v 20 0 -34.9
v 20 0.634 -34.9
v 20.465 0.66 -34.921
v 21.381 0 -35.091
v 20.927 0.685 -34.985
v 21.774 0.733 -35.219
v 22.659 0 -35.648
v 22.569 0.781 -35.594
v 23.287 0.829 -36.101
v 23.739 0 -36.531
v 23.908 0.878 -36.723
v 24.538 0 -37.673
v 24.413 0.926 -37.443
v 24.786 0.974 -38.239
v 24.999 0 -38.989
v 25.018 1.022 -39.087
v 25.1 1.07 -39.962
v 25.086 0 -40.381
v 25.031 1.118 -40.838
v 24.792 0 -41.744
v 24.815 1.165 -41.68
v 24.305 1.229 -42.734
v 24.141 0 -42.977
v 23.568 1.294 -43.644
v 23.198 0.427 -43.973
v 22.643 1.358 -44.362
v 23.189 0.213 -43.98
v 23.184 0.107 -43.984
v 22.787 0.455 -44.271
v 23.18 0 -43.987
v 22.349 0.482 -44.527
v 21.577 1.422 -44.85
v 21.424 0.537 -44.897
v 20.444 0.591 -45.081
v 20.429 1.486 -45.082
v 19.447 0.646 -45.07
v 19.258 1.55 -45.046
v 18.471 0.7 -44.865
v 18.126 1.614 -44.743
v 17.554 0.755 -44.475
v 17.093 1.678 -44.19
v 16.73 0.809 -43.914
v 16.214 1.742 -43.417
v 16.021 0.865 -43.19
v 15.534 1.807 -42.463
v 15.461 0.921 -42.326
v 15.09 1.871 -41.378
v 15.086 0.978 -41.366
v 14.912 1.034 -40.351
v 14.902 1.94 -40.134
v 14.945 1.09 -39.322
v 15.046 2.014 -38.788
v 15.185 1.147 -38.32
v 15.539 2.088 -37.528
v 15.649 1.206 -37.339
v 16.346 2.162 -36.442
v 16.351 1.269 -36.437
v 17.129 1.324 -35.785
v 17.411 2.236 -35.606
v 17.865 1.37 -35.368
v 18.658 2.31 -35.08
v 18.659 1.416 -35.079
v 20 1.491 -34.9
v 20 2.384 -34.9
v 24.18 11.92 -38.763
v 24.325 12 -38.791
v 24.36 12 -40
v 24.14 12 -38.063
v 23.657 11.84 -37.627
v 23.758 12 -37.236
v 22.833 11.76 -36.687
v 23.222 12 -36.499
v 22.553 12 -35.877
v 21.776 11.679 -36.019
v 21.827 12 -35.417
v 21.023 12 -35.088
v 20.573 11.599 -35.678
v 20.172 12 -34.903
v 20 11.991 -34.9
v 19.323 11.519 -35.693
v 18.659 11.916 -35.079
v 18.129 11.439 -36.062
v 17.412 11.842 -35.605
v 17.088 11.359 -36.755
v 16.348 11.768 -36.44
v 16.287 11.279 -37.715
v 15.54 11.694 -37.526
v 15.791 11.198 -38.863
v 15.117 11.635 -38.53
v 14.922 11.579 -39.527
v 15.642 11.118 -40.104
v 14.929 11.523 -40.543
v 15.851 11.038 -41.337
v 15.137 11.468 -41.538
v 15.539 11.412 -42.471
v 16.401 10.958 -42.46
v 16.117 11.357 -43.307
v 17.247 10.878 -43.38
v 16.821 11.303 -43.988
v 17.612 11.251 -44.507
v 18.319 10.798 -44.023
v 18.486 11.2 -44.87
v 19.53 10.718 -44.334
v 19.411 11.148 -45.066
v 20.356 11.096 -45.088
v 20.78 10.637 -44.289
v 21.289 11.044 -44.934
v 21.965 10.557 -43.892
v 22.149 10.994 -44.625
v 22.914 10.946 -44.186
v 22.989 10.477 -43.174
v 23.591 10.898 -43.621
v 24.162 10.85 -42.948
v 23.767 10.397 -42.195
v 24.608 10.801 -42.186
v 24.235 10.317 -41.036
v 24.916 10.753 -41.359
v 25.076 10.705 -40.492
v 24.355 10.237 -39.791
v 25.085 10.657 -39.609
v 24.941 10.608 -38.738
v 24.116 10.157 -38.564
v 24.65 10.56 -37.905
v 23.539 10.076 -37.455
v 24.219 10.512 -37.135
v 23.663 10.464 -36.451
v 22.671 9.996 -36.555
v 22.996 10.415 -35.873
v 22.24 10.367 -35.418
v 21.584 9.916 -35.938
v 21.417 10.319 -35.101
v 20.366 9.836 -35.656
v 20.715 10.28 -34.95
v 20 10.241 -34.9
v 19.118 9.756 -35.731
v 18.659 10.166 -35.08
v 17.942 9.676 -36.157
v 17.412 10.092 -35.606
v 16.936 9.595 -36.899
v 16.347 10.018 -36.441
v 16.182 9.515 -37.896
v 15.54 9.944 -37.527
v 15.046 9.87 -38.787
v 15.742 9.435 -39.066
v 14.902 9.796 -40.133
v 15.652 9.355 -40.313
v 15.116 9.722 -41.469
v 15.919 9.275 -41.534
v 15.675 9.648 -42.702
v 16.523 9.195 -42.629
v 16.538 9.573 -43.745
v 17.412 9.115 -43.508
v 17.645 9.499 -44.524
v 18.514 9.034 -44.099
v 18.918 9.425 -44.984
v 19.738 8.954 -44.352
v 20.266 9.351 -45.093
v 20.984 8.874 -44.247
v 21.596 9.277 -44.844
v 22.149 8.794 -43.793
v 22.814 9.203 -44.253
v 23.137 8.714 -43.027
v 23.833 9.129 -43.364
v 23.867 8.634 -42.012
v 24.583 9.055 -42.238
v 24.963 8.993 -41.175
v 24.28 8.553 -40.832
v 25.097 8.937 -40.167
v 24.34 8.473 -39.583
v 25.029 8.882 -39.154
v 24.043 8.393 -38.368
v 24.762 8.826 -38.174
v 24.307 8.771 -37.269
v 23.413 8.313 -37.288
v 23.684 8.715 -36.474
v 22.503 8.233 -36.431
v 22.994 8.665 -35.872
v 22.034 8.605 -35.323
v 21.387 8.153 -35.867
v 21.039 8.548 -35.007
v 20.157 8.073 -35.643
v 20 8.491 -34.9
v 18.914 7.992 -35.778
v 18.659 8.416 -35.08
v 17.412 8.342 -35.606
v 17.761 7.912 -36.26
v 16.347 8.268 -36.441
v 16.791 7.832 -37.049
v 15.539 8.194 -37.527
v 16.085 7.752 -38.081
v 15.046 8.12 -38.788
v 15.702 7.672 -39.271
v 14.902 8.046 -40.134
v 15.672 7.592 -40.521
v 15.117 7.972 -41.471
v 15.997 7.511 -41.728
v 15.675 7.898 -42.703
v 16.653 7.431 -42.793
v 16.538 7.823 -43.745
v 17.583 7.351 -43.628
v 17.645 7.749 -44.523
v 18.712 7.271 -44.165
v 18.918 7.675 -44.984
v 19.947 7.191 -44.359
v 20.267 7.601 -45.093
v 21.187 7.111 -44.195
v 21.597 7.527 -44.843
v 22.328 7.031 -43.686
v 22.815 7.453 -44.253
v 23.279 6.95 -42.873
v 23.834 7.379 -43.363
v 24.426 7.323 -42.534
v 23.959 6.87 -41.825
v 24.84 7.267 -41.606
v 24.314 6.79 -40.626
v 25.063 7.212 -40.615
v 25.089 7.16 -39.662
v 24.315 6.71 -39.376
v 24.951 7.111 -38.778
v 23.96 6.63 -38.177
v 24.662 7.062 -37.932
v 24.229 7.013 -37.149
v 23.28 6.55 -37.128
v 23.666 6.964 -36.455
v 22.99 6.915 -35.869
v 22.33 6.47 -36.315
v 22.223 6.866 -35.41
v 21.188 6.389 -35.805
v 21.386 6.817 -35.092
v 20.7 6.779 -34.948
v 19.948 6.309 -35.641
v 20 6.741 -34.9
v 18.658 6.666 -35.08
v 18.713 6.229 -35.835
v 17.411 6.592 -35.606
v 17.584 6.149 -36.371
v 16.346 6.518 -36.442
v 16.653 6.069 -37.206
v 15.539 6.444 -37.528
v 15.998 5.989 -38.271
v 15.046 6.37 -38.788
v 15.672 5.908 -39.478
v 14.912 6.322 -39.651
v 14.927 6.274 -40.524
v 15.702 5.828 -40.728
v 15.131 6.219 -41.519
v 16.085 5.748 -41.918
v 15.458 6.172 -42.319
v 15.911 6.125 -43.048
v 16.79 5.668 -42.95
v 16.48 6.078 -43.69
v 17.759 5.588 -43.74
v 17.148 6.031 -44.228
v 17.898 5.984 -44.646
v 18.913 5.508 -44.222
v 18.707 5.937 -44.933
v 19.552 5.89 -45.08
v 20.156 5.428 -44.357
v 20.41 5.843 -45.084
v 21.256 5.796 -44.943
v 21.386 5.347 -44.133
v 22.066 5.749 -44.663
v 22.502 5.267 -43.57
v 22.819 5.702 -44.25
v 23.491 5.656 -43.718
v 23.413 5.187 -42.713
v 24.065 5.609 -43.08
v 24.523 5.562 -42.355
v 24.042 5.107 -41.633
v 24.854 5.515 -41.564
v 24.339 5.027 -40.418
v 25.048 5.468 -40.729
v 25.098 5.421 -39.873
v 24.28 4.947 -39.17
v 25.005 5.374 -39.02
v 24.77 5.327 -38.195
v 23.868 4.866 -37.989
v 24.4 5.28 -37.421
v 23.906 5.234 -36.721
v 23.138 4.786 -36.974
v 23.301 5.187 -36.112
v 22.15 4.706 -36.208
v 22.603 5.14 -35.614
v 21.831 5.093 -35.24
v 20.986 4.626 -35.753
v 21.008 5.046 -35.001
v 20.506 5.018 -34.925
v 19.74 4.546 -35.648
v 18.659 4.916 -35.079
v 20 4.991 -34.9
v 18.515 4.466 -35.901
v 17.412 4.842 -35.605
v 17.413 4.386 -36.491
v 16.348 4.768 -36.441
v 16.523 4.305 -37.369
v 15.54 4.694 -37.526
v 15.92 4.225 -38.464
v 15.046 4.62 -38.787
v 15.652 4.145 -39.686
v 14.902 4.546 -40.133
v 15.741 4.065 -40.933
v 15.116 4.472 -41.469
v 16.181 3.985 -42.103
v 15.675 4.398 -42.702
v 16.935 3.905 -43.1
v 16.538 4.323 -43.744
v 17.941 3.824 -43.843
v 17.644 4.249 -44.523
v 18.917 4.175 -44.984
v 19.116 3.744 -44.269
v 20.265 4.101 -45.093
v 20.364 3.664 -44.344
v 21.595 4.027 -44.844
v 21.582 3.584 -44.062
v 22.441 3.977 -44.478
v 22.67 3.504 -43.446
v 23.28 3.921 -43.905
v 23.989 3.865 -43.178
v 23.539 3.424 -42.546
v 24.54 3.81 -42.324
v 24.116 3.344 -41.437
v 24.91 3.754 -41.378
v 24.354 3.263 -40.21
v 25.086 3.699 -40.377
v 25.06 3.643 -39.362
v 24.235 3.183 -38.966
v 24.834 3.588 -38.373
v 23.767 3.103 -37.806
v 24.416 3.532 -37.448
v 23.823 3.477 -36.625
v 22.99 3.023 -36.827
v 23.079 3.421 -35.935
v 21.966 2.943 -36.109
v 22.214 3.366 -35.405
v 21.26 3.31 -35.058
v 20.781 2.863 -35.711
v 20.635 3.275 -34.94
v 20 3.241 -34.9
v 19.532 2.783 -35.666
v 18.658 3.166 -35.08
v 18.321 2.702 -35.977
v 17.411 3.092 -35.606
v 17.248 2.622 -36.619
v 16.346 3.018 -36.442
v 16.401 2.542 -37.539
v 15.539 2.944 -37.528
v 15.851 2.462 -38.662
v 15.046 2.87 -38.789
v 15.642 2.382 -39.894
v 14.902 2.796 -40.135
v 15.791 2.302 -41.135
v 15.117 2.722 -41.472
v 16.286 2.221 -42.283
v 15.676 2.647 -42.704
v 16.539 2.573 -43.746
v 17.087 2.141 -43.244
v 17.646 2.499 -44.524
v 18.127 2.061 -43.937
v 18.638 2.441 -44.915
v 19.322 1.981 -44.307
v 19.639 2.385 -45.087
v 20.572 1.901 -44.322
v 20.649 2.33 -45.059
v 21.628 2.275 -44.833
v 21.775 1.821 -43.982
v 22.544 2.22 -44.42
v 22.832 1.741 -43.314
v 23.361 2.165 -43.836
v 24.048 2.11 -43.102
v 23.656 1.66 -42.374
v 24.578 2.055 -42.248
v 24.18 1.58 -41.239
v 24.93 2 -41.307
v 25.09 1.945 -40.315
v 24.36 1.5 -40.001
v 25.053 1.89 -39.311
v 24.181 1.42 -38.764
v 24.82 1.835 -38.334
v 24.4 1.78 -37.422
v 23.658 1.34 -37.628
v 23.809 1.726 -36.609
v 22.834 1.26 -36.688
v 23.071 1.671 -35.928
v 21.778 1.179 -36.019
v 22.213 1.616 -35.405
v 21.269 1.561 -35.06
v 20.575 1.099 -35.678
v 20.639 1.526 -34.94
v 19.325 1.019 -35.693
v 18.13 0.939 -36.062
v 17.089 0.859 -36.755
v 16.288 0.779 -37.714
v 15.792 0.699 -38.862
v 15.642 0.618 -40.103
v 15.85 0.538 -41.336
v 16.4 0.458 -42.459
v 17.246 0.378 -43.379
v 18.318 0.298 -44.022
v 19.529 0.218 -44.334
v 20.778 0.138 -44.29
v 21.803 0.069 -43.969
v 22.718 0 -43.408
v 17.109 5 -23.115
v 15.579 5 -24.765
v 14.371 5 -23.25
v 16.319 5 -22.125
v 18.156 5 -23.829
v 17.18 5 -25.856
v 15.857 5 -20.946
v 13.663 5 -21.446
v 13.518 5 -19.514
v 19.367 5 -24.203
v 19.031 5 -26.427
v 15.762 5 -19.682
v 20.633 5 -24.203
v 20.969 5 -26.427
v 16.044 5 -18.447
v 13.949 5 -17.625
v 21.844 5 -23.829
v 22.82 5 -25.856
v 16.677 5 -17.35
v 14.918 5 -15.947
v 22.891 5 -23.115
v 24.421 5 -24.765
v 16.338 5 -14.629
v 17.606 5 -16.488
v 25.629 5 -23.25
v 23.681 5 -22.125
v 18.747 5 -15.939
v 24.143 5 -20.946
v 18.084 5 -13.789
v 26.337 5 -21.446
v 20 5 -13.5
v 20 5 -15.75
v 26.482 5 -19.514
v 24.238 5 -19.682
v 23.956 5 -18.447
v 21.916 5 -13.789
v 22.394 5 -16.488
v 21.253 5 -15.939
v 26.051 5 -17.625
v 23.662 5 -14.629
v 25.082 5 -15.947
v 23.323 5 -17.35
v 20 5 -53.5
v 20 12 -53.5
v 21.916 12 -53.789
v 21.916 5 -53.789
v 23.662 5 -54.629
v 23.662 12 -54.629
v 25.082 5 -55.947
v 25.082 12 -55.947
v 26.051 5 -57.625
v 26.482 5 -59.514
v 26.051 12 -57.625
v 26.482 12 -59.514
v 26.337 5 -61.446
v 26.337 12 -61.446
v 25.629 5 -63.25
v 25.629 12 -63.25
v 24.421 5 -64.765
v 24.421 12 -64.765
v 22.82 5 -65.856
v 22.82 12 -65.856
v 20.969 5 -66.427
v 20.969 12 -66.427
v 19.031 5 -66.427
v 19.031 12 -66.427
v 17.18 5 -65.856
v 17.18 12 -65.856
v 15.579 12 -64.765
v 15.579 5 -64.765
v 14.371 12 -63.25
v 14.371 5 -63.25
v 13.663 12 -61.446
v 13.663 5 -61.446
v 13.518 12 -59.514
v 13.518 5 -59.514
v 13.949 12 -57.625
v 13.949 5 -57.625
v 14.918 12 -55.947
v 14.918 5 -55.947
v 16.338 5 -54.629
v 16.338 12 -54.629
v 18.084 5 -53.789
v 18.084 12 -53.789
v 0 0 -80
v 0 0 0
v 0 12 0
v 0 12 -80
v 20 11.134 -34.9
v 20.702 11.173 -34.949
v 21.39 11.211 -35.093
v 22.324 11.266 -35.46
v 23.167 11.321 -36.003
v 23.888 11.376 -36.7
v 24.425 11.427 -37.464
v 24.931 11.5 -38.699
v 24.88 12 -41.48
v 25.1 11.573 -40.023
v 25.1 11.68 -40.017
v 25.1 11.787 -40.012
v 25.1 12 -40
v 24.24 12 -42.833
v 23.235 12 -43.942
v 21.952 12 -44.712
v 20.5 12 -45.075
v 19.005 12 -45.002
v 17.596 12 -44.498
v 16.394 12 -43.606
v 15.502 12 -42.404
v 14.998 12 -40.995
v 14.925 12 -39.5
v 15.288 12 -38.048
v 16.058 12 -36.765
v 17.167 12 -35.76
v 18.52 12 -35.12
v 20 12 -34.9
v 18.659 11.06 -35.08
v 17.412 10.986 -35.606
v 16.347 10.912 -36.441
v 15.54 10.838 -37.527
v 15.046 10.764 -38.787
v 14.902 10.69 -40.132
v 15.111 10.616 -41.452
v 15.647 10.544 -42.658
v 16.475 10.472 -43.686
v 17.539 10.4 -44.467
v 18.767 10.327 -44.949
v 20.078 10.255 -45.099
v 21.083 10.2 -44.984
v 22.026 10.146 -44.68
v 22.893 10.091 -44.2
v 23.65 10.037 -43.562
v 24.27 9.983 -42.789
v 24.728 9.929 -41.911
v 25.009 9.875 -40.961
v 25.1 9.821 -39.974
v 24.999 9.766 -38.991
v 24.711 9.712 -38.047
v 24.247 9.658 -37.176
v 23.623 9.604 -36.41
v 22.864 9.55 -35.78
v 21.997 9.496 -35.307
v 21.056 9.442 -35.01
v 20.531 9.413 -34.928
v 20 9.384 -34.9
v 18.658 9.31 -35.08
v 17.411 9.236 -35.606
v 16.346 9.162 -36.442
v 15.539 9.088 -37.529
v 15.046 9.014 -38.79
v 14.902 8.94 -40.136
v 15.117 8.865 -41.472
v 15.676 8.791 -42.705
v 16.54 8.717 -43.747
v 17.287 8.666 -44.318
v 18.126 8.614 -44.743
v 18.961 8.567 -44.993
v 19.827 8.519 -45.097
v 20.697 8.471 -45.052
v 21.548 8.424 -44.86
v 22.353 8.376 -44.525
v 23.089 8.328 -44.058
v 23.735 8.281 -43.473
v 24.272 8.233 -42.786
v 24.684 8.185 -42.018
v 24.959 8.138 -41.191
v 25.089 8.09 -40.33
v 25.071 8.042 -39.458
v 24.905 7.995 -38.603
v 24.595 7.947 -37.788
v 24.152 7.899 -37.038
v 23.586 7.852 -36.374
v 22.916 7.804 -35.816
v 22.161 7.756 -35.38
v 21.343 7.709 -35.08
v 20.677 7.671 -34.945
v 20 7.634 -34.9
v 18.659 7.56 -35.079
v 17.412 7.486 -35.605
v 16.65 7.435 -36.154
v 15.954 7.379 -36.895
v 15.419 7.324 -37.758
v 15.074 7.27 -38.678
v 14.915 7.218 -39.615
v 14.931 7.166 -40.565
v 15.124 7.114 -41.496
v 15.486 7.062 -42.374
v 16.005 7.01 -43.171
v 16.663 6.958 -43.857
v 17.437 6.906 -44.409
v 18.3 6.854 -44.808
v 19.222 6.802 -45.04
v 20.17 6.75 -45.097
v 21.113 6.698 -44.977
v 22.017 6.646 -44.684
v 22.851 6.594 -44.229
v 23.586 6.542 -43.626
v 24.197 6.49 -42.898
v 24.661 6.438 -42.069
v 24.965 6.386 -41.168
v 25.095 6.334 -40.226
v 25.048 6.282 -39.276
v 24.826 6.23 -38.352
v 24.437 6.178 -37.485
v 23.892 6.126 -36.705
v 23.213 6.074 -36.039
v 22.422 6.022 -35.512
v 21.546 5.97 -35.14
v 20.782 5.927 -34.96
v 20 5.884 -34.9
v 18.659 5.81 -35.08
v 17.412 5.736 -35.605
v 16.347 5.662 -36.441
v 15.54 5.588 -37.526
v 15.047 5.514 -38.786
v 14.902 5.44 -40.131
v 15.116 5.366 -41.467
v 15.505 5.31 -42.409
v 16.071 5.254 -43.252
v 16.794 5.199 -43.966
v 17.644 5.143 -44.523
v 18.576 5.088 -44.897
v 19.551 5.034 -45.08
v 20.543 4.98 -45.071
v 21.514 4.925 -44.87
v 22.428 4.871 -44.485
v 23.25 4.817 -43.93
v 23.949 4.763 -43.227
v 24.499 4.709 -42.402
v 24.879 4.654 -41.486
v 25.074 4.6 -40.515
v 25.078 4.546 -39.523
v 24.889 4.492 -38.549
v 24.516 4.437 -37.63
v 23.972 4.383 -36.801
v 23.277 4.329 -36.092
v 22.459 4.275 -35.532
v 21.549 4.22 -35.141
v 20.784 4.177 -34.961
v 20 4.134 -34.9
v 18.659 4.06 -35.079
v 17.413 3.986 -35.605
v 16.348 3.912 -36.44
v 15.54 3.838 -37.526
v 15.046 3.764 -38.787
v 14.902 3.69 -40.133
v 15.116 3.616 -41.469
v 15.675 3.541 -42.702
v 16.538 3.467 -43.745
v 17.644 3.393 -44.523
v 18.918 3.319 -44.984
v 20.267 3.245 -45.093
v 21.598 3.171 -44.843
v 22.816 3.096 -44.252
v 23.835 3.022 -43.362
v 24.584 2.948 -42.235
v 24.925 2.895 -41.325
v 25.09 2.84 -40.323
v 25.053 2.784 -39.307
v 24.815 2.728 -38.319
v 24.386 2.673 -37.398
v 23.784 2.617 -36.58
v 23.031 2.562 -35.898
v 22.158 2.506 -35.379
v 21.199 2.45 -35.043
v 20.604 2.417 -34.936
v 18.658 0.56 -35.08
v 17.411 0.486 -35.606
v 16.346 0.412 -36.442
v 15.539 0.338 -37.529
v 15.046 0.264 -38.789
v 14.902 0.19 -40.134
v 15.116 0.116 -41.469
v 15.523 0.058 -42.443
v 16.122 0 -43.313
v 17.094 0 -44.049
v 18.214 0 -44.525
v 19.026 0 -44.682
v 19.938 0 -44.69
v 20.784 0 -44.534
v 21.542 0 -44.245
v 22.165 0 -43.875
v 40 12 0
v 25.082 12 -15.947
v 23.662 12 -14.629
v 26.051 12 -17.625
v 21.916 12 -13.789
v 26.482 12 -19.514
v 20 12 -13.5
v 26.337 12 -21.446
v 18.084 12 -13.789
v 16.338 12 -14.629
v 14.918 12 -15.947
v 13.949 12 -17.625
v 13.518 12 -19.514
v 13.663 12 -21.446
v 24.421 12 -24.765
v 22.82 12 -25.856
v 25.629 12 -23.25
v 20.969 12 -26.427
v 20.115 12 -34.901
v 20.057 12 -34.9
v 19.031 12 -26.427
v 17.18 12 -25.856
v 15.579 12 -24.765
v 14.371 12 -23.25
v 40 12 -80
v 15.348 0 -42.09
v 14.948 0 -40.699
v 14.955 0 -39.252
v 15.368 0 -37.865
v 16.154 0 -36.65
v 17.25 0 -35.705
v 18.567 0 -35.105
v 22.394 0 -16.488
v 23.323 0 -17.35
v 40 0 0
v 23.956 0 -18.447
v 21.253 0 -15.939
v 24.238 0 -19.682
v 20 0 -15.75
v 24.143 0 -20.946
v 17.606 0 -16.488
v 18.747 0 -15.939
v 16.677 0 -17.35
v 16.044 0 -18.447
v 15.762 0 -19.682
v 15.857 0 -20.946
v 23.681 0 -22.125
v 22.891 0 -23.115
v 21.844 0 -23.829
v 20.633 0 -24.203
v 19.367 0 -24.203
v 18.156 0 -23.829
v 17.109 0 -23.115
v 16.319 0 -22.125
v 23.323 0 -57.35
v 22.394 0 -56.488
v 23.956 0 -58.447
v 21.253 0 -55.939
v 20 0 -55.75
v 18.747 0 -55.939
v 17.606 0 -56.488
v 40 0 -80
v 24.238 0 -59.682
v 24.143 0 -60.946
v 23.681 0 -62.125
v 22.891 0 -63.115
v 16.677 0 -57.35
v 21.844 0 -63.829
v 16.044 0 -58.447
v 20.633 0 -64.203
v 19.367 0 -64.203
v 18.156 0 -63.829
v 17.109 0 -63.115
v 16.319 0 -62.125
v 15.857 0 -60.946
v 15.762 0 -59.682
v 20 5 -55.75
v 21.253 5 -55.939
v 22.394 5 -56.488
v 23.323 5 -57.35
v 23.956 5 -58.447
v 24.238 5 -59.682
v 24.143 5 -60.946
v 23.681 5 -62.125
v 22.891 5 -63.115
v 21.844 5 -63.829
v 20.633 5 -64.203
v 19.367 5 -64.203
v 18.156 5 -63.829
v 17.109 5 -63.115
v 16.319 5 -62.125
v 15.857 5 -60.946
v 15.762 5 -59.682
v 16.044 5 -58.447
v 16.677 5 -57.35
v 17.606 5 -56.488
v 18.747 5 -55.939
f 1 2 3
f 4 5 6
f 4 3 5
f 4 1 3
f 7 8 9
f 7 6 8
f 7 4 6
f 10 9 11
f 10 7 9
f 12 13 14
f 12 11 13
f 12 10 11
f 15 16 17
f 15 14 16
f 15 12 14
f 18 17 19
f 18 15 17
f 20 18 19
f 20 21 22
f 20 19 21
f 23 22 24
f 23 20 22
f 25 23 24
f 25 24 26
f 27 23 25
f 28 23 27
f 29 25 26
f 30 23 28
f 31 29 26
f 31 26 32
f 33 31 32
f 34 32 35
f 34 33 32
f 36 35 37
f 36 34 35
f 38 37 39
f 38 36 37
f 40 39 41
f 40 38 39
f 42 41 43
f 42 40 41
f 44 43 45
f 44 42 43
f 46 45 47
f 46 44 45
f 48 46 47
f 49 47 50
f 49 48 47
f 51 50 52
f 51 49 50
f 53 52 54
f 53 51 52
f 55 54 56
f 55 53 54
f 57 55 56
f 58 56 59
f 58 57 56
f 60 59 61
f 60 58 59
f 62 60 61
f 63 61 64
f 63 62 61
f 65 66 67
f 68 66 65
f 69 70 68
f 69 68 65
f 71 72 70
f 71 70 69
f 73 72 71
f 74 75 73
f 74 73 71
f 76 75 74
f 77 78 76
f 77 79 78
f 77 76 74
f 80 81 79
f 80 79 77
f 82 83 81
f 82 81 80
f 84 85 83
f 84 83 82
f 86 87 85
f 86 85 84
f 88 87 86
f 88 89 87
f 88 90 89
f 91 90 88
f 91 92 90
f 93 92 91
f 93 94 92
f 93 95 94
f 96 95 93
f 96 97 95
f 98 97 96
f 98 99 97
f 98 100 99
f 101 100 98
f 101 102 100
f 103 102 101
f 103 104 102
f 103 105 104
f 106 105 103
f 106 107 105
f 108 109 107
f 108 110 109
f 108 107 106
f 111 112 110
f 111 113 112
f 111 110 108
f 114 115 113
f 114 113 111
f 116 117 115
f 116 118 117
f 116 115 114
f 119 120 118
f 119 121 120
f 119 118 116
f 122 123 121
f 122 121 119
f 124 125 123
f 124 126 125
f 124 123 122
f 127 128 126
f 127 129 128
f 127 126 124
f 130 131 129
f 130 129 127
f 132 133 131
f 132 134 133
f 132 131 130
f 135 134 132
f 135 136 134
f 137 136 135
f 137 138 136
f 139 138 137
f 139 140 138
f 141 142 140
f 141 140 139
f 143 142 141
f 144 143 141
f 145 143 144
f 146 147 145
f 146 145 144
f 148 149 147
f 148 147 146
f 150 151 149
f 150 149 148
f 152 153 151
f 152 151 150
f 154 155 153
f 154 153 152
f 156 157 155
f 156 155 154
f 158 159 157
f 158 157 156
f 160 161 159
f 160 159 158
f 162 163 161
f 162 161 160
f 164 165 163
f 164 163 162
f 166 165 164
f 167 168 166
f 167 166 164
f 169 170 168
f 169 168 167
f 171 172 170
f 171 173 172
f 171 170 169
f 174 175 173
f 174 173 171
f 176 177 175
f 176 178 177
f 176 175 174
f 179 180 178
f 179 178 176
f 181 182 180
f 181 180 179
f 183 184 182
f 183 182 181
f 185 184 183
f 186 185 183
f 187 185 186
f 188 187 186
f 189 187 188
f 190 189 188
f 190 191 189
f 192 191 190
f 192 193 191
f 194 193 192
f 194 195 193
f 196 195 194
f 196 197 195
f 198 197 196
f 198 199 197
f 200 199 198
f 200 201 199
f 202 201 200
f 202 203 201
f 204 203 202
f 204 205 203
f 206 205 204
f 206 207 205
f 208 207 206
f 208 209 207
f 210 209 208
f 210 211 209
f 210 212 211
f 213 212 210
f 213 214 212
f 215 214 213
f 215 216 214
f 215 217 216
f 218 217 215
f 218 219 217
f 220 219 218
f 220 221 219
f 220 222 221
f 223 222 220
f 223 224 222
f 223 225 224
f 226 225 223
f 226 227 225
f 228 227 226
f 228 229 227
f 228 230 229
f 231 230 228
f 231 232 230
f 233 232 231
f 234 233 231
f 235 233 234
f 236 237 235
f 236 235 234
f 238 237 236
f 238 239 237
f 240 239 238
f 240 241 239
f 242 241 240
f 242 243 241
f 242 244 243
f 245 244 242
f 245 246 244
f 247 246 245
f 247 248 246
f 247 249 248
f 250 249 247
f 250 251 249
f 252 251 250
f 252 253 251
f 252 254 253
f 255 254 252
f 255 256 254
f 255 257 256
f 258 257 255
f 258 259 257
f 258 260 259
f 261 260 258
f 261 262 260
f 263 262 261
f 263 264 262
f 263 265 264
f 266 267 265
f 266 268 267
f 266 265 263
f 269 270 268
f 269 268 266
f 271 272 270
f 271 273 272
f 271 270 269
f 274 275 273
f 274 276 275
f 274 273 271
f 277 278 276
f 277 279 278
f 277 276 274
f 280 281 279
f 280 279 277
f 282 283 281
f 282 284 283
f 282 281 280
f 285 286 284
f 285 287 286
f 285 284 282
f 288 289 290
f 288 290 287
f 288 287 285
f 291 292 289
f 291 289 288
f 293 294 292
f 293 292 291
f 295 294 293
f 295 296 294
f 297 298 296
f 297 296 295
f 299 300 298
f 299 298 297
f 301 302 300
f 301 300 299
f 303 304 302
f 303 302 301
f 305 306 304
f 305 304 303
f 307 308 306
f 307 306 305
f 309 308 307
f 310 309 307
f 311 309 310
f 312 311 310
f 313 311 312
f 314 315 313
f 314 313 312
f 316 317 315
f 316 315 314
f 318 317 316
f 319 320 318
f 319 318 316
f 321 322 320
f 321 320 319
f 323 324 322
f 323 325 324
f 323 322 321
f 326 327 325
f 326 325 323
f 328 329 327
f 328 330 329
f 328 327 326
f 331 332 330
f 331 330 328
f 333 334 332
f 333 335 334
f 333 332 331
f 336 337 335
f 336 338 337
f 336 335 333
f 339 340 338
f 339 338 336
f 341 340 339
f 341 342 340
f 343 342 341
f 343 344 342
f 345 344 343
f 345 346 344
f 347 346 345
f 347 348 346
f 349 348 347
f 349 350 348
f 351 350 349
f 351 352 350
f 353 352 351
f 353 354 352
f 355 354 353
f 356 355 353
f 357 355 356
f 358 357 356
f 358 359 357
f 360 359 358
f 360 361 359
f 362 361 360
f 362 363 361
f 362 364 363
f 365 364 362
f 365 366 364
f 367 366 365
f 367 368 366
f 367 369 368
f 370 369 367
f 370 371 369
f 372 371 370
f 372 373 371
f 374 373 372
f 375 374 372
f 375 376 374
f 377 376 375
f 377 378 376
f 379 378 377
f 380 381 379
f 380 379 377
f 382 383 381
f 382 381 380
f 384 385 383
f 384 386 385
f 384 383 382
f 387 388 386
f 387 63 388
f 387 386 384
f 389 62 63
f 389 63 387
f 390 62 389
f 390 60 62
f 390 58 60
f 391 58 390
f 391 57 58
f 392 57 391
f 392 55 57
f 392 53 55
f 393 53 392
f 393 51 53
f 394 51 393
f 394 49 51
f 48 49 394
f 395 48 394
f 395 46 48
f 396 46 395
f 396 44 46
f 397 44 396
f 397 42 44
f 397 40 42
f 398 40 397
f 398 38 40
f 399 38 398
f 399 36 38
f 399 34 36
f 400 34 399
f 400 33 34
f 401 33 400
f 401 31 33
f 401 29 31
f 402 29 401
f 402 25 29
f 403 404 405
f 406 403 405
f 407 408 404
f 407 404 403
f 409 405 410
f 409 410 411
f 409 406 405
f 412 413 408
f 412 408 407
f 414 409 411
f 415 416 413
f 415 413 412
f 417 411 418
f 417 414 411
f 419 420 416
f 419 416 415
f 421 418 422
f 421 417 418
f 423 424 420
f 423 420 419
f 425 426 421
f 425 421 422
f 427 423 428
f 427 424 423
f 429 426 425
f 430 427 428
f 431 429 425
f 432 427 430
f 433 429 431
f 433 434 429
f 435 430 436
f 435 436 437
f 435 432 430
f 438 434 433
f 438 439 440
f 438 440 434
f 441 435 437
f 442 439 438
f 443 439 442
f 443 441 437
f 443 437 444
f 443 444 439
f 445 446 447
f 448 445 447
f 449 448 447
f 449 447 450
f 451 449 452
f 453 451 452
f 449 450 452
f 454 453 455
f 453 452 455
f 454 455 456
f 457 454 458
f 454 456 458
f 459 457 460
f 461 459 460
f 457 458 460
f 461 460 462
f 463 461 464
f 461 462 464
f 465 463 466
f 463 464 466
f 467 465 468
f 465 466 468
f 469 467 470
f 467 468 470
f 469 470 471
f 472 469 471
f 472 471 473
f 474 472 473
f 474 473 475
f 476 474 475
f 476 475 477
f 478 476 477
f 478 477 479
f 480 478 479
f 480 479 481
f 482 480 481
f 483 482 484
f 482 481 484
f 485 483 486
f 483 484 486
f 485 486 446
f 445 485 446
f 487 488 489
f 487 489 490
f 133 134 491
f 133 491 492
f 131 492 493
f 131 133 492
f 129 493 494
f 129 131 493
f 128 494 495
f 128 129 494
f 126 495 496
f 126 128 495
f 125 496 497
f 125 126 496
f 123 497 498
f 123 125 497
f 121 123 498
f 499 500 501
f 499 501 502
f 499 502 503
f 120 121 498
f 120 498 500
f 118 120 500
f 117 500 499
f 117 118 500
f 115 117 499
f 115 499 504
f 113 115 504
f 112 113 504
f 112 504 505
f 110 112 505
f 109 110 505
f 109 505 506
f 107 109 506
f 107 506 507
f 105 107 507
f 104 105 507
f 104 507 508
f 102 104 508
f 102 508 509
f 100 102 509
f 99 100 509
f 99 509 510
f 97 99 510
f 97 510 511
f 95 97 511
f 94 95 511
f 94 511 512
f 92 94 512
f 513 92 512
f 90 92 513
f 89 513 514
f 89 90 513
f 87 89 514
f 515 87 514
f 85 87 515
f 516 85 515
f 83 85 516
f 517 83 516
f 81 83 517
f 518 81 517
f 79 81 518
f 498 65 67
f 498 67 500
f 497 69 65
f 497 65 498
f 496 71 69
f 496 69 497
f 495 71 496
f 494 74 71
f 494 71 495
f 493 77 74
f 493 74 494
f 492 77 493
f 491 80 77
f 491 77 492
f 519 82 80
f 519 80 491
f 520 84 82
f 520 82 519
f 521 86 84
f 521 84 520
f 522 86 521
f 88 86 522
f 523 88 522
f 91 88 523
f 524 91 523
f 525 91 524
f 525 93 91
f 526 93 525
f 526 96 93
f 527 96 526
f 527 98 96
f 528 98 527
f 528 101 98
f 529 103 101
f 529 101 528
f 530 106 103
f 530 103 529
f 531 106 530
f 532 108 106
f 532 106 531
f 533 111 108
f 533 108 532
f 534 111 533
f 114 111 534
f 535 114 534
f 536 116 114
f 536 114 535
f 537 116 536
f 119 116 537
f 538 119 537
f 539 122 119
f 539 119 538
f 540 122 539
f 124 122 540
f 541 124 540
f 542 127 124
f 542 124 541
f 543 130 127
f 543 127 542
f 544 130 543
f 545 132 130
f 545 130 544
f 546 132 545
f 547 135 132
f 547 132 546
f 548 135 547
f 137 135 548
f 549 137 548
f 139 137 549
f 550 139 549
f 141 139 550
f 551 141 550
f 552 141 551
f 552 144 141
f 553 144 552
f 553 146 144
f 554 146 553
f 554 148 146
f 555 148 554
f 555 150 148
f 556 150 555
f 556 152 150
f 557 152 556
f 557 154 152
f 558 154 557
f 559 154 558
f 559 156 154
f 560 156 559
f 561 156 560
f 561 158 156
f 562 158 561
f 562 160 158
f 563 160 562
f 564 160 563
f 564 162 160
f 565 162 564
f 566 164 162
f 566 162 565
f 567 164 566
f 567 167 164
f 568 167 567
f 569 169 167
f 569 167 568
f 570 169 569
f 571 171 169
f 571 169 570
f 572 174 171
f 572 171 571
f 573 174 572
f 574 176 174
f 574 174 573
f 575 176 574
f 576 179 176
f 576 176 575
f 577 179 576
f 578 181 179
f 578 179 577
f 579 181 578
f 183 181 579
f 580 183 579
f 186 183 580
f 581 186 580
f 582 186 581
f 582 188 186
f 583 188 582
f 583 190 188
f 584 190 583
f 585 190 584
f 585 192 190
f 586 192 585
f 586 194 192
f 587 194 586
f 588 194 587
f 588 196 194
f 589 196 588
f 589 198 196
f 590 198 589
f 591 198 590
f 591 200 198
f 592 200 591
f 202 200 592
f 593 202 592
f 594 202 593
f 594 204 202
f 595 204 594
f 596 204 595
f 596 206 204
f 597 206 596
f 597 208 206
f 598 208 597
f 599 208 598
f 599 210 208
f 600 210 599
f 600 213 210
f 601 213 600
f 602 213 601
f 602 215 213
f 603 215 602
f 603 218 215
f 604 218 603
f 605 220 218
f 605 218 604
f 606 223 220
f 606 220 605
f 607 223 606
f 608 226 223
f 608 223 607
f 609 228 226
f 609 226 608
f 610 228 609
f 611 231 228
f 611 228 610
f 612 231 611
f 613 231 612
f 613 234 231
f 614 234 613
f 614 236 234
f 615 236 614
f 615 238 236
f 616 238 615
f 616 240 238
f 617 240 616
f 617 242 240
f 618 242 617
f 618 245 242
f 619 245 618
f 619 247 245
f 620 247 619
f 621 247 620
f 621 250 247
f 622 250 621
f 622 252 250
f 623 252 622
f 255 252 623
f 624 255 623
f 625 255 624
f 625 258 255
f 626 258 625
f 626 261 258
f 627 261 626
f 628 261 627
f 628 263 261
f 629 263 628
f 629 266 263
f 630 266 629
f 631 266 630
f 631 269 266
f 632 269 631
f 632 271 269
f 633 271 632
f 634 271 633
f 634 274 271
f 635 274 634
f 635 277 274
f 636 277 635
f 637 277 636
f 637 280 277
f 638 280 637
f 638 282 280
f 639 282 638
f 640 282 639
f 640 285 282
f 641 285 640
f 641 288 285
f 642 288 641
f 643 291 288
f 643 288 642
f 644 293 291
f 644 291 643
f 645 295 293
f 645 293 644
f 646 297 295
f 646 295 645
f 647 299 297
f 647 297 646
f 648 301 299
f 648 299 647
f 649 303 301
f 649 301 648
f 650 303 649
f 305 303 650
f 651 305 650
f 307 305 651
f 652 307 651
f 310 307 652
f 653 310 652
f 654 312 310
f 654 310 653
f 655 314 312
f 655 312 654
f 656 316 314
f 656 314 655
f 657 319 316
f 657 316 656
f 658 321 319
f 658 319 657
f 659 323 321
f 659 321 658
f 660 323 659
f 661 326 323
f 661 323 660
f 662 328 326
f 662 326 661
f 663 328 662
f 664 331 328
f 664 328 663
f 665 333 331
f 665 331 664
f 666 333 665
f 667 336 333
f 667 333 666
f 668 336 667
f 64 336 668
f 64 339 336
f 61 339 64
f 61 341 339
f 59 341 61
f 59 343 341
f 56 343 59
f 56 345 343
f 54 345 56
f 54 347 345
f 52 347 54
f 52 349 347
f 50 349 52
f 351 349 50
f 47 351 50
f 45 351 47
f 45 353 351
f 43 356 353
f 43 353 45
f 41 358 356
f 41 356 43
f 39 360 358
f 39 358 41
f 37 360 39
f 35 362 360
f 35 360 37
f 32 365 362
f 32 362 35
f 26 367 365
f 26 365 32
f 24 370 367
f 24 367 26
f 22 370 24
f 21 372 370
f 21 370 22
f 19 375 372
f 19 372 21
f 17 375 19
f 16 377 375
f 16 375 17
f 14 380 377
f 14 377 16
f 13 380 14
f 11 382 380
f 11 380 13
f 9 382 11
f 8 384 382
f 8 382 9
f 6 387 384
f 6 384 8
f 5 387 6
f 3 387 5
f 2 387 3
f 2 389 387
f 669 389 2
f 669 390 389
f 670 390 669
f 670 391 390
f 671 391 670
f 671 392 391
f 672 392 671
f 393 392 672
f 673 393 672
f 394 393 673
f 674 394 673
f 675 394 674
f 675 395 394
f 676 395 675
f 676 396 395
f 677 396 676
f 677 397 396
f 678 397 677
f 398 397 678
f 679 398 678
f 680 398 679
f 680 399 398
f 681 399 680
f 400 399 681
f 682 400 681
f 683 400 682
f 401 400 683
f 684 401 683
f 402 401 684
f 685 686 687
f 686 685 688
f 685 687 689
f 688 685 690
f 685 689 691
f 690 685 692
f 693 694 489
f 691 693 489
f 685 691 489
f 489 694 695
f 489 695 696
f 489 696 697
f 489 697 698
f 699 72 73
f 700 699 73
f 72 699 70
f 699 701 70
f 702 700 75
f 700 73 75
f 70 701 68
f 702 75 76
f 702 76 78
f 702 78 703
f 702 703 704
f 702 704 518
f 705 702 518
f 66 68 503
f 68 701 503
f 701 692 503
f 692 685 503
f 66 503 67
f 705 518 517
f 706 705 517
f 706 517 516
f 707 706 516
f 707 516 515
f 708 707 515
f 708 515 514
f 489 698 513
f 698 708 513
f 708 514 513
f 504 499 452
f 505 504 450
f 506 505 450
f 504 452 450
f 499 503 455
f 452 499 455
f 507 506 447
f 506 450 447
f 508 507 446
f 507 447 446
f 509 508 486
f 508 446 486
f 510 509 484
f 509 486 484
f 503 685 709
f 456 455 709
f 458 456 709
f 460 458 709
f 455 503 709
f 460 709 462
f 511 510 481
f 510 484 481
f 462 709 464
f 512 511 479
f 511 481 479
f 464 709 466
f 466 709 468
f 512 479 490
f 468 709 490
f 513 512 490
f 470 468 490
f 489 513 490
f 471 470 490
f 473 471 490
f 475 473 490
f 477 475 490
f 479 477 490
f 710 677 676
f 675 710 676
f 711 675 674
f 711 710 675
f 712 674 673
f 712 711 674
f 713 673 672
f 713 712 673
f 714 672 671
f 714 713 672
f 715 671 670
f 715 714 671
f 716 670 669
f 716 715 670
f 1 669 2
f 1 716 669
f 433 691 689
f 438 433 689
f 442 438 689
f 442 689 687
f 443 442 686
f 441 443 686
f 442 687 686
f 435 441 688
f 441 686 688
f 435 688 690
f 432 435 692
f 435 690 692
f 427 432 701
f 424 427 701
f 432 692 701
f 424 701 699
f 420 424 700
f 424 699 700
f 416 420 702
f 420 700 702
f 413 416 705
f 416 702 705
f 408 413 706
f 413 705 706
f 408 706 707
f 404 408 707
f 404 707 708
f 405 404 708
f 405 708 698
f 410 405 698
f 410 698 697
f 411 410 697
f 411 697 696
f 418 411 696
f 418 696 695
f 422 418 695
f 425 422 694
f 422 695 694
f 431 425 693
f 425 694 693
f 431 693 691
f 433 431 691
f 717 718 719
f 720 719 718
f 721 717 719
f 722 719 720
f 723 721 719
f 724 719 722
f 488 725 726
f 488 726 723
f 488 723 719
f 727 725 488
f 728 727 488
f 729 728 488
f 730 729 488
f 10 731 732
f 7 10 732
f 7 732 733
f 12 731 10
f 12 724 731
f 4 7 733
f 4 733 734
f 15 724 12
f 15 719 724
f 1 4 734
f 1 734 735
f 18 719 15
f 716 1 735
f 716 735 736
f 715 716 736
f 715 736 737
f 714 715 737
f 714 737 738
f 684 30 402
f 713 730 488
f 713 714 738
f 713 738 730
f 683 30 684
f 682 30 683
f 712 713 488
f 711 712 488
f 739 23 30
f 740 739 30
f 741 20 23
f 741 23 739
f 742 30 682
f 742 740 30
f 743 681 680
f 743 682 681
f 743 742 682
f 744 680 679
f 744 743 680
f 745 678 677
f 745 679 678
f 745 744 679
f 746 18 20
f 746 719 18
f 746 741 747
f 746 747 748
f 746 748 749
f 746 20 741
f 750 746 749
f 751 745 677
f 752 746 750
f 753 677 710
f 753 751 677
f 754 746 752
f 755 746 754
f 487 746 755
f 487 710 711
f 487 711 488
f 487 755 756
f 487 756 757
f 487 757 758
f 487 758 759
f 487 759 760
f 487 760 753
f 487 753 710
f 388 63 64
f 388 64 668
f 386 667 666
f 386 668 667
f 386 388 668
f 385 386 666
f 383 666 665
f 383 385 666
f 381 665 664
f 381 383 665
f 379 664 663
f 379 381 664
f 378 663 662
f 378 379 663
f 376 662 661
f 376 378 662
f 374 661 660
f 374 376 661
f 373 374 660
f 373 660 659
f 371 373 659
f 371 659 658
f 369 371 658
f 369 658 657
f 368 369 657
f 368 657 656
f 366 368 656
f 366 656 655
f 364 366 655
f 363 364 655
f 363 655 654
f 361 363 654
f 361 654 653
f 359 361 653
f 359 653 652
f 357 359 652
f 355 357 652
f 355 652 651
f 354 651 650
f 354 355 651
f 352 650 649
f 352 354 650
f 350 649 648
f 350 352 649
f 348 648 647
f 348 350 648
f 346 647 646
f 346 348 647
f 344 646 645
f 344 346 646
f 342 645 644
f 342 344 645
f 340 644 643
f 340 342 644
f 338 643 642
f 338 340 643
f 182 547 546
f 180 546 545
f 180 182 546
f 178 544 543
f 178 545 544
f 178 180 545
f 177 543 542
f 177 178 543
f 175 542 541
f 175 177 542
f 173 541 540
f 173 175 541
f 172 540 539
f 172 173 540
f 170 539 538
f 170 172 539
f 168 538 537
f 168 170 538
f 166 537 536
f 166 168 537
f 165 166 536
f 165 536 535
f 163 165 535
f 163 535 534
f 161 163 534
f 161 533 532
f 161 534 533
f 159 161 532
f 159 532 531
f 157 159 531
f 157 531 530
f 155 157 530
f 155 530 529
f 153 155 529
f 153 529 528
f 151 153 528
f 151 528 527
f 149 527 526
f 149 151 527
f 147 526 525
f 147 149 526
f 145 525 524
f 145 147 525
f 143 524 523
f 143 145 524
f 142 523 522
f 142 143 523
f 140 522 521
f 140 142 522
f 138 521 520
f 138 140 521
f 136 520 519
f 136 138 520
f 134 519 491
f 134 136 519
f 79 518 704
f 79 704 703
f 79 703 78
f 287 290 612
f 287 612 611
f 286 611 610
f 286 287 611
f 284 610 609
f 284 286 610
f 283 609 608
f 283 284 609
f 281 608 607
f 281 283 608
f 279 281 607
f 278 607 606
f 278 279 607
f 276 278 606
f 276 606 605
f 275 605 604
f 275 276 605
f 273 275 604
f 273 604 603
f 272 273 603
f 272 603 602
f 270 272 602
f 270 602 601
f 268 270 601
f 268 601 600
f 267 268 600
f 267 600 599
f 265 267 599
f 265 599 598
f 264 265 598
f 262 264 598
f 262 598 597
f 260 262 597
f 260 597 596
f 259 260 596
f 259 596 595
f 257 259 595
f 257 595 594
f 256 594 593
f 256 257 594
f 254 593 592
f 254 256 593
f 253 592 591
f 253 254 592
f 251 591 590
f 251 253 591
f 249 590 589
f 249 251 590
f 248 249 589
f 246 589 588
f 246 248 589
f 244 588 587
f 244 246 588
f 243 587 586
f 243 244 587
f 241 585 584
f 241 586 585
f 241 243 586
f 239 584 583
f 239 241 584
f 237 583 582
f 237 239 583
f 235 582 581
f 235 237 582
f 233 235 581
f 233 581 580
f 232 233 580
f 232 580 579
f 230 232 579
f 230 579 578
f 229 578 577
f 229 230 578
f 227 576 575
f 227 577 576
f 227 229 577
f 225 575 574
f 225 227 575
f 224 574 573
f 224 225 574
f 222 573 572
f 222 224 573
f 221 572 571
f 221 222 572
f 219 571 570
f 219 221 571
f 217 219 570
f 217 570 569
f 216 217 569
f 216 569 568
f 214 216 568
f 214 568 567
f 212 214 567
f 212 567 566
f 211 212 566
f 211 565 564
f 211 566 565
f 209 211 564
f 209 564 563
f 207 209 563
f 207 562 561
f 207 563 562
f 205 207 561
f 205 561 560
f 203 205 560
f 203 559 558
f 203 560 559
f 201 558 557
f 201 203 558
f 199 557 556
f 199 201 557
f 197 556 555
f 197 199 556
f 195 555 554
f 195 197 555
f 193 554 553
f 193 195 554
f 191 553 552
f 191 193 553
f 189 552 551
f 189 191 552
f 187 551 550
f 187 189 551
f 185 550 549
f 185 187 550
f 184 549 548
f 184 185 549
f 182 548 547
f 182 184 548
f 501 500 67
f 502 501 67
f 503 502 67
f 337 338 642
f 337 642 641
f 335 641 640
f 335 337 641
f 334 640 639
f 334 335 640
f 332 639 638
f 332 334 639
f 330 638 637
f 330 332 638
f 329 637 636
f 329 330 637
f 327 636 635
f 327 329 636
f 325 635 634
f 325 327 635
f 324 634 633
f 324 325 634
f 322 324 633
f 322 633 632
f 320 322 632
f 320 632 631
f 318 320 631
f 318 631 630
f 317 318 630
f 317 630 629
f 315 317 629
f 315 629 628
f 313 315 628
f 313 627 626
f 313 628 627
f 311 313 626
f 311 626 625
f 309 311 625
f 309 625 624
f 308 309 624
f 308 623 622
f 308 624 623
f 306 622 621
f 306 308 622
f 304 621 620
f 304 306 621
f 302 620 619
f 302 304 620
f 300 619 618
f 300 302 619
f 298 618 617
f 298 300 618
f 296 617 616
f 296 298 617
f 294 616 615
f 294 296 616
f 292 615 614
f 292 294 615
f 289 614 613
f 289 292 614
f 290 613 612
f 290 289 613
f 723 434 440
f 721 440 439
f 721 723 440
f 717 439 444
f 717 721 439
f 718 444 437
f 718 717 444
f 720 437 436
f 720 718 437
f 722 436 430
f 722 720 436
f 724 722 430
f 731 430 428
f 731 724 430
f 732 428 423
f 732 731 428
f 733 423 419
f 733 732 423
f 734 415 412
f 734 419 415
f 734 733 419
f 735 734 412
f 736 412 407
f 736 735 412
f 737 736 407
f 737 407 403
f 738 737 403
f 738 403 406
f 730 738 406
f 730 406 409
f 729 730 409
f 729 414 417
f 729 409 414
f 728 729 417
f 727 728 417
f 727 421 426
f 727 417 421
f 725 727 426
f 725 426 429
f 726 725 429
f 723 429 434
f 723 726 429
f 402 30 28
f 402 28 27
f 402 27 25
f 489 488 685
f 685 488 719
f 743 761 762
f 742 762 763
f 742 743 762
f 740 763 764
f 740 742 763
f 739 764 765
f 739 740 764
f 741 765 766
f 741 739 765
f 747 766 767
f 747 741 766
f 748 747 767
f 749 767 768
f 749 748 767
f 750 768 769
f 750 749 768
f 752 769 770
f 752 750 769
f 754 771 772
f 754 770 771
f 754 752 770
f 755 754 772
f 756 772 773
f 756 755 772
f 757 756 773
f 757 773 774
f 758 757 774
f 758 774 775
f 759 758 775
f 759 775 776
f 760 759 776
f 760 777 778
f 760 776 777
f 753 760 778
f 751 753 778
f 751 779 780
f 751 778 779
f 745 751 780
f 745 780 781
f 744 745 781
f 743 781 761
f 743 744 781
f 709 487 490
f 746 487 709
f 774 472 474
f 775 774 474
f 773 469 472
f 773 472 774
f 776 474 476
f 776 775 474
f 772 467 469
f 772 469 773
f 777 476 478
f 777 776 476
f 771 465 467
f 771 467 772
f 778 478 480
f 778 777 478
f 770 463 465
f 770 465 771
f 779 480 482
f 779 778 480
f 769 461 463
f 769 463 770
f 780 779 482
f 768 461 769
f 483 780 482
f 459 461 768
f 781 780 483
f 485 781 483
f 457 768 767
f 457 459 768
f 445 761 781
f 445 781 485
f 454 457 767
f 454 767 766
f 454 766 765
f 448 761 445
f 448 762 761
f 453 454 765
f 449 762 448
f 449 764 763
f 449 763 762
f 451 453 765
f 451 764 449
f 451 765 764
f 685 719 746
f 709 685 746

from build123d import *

# Parameters (mm, degrees)
SKETCH_1_W          = 40
SKETCH_1_H          = 80
SKETCH_1_R          = 4.25
SKETCH_1_R_2        = 5.1
EXTRUDE_1_DEPTH     = 12
SKETCH_3_R          = 6.5
CUT_EXTRUDE_1_DEPTH = 7
SWEEP_1_PITCH       = 1.75
SWEEP_1_HEIGHT      = 12
SWEEP_1_RADIUS      = 5.1
SWEEP_1_START_ANGLE = 90
SKETCH_6_W          = 42.021889548
SKETCH_6_H          = 2.845778449
SKETCH_6_W_2        = 42.914668854
SKETCH_6_H_2        = 10.152042119
CUT_EXTRUDE_2_DEPTH = 91.331481783


with BuildPart() as part:
    # 草图1 → 凸台-拉伸1 (new body)
    with BuildSketch(Plane(origin=(0, 0, 0), x_dir=(1, 0, 0), z_dir=(0, 1, 0))):
        with Locations((20, 40)):
            Rectangle(SKETCH_1_W, SKETCH_1_H)
        with Locations(Location((20, 60, 0), (0, 0, 270))):
            Circle(SKETCH_1_R, mode=Mode.SUBTRACT)
        with Locations(Location((20, 20, 0), (0, 0, 270))):
            Circle(SKETCH_1_R, mode=Mode.SUBTRACT)
        with Locations(Location((20, 40, 0), (0, 0, 270))):
            Circle(SKETCH_1_R_2, mode=Mode.SUBTRACT)
    extrude(amount=EXTRUDE_1_DEPTH)

    # 草图3 → 切除-拉伸1 (cut)
    with BuildSketch(Plane(origin=(0, 12, 0), x_dir=(1, 0, 0), z_dir=(0, 1, 0))):
        with Locations(Location((20, 20, 0), (0, 0, 270))):
            Circle(SKETCH_3_R)
        with Locations(Location((20, 60, 0), (0, 0, 270))):
            Circle(SKETCH_3_R)
    extrude(amount=-CUT_EXTRUDE_1_DEPTH, mode=Mode.SUBTRACT)

    # 扫描1: sweep along a helix
    with BuildLine() as sweep_1_path:
        add(Helix(SWEEP_1_PITCH, SWEEP_1_HEIGHT, SWEEP_1_RADIUS, center=(20, 12, -40), direction=(0, -1, 0), mode=Mode.PRIVATE).rotate(Axis((20, 12, -40), (0, -1, 0)), SWEEP_1_START_ANGLE))
    # 草图5 → 扫描1 (sweep)
    with BuildSketch(Plane(origin=(25.1, 12, -40), x_dir=(1, 0, 0), z_dir=(5.189082450239955e-15, -0.054530732695540304, 0.9985120926617203))):
        Polygon((-0.740428606, 0), (0.370214303, -0.641229983), (0.370214303, 0.641229983), align=None)
    sweep(path=sweep_1_path.line, is_frenet=True)

    # 草图6 → 切除-拉伸2 (cut, through all)
    with BuildSketch(Plane(origin=(0, 0, -80), x_dir=(-1, 0, 0), z_dir=(0, 0, -1))):
        with Locations((-18.989055226, 13.422889225)):
            Rectangle(SKETCH_6_W, SKETCH_6_H)
        with Locations((-18.542665573, -5.07602106)):
            Rectangle(SKETCH_6_W_2, SKETCH_6_H_2)
    extrude(amount=-CUT_EXTRUDE_2_DEPTH, mode=Mode.SUBTRACT)


solid = part.part
